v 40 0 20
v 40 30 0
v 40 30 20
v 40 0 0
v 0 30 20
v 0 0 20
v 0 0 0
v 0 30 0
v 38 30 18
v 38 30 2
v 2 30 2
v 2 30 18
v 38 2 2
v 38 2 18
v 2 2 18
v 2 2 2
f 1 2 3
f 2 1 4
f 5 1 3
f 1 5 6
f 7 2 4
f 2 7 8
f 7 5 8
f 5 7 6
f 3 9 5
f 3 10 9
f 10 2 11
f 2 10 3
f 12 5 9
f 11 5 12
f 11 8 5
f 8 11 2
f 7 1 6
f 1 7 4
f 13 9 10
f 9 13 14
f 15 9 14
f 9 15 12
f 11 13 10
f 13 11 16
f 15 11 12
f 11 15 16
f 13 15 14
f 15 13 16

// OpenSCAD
// units=mm — generated by scad_emitter.py
// part=unnamed
$fn = 48;

difference() { cube([40, 30, 20]); translate([2, 2, 2]) cube([36, 30, 16]); }
